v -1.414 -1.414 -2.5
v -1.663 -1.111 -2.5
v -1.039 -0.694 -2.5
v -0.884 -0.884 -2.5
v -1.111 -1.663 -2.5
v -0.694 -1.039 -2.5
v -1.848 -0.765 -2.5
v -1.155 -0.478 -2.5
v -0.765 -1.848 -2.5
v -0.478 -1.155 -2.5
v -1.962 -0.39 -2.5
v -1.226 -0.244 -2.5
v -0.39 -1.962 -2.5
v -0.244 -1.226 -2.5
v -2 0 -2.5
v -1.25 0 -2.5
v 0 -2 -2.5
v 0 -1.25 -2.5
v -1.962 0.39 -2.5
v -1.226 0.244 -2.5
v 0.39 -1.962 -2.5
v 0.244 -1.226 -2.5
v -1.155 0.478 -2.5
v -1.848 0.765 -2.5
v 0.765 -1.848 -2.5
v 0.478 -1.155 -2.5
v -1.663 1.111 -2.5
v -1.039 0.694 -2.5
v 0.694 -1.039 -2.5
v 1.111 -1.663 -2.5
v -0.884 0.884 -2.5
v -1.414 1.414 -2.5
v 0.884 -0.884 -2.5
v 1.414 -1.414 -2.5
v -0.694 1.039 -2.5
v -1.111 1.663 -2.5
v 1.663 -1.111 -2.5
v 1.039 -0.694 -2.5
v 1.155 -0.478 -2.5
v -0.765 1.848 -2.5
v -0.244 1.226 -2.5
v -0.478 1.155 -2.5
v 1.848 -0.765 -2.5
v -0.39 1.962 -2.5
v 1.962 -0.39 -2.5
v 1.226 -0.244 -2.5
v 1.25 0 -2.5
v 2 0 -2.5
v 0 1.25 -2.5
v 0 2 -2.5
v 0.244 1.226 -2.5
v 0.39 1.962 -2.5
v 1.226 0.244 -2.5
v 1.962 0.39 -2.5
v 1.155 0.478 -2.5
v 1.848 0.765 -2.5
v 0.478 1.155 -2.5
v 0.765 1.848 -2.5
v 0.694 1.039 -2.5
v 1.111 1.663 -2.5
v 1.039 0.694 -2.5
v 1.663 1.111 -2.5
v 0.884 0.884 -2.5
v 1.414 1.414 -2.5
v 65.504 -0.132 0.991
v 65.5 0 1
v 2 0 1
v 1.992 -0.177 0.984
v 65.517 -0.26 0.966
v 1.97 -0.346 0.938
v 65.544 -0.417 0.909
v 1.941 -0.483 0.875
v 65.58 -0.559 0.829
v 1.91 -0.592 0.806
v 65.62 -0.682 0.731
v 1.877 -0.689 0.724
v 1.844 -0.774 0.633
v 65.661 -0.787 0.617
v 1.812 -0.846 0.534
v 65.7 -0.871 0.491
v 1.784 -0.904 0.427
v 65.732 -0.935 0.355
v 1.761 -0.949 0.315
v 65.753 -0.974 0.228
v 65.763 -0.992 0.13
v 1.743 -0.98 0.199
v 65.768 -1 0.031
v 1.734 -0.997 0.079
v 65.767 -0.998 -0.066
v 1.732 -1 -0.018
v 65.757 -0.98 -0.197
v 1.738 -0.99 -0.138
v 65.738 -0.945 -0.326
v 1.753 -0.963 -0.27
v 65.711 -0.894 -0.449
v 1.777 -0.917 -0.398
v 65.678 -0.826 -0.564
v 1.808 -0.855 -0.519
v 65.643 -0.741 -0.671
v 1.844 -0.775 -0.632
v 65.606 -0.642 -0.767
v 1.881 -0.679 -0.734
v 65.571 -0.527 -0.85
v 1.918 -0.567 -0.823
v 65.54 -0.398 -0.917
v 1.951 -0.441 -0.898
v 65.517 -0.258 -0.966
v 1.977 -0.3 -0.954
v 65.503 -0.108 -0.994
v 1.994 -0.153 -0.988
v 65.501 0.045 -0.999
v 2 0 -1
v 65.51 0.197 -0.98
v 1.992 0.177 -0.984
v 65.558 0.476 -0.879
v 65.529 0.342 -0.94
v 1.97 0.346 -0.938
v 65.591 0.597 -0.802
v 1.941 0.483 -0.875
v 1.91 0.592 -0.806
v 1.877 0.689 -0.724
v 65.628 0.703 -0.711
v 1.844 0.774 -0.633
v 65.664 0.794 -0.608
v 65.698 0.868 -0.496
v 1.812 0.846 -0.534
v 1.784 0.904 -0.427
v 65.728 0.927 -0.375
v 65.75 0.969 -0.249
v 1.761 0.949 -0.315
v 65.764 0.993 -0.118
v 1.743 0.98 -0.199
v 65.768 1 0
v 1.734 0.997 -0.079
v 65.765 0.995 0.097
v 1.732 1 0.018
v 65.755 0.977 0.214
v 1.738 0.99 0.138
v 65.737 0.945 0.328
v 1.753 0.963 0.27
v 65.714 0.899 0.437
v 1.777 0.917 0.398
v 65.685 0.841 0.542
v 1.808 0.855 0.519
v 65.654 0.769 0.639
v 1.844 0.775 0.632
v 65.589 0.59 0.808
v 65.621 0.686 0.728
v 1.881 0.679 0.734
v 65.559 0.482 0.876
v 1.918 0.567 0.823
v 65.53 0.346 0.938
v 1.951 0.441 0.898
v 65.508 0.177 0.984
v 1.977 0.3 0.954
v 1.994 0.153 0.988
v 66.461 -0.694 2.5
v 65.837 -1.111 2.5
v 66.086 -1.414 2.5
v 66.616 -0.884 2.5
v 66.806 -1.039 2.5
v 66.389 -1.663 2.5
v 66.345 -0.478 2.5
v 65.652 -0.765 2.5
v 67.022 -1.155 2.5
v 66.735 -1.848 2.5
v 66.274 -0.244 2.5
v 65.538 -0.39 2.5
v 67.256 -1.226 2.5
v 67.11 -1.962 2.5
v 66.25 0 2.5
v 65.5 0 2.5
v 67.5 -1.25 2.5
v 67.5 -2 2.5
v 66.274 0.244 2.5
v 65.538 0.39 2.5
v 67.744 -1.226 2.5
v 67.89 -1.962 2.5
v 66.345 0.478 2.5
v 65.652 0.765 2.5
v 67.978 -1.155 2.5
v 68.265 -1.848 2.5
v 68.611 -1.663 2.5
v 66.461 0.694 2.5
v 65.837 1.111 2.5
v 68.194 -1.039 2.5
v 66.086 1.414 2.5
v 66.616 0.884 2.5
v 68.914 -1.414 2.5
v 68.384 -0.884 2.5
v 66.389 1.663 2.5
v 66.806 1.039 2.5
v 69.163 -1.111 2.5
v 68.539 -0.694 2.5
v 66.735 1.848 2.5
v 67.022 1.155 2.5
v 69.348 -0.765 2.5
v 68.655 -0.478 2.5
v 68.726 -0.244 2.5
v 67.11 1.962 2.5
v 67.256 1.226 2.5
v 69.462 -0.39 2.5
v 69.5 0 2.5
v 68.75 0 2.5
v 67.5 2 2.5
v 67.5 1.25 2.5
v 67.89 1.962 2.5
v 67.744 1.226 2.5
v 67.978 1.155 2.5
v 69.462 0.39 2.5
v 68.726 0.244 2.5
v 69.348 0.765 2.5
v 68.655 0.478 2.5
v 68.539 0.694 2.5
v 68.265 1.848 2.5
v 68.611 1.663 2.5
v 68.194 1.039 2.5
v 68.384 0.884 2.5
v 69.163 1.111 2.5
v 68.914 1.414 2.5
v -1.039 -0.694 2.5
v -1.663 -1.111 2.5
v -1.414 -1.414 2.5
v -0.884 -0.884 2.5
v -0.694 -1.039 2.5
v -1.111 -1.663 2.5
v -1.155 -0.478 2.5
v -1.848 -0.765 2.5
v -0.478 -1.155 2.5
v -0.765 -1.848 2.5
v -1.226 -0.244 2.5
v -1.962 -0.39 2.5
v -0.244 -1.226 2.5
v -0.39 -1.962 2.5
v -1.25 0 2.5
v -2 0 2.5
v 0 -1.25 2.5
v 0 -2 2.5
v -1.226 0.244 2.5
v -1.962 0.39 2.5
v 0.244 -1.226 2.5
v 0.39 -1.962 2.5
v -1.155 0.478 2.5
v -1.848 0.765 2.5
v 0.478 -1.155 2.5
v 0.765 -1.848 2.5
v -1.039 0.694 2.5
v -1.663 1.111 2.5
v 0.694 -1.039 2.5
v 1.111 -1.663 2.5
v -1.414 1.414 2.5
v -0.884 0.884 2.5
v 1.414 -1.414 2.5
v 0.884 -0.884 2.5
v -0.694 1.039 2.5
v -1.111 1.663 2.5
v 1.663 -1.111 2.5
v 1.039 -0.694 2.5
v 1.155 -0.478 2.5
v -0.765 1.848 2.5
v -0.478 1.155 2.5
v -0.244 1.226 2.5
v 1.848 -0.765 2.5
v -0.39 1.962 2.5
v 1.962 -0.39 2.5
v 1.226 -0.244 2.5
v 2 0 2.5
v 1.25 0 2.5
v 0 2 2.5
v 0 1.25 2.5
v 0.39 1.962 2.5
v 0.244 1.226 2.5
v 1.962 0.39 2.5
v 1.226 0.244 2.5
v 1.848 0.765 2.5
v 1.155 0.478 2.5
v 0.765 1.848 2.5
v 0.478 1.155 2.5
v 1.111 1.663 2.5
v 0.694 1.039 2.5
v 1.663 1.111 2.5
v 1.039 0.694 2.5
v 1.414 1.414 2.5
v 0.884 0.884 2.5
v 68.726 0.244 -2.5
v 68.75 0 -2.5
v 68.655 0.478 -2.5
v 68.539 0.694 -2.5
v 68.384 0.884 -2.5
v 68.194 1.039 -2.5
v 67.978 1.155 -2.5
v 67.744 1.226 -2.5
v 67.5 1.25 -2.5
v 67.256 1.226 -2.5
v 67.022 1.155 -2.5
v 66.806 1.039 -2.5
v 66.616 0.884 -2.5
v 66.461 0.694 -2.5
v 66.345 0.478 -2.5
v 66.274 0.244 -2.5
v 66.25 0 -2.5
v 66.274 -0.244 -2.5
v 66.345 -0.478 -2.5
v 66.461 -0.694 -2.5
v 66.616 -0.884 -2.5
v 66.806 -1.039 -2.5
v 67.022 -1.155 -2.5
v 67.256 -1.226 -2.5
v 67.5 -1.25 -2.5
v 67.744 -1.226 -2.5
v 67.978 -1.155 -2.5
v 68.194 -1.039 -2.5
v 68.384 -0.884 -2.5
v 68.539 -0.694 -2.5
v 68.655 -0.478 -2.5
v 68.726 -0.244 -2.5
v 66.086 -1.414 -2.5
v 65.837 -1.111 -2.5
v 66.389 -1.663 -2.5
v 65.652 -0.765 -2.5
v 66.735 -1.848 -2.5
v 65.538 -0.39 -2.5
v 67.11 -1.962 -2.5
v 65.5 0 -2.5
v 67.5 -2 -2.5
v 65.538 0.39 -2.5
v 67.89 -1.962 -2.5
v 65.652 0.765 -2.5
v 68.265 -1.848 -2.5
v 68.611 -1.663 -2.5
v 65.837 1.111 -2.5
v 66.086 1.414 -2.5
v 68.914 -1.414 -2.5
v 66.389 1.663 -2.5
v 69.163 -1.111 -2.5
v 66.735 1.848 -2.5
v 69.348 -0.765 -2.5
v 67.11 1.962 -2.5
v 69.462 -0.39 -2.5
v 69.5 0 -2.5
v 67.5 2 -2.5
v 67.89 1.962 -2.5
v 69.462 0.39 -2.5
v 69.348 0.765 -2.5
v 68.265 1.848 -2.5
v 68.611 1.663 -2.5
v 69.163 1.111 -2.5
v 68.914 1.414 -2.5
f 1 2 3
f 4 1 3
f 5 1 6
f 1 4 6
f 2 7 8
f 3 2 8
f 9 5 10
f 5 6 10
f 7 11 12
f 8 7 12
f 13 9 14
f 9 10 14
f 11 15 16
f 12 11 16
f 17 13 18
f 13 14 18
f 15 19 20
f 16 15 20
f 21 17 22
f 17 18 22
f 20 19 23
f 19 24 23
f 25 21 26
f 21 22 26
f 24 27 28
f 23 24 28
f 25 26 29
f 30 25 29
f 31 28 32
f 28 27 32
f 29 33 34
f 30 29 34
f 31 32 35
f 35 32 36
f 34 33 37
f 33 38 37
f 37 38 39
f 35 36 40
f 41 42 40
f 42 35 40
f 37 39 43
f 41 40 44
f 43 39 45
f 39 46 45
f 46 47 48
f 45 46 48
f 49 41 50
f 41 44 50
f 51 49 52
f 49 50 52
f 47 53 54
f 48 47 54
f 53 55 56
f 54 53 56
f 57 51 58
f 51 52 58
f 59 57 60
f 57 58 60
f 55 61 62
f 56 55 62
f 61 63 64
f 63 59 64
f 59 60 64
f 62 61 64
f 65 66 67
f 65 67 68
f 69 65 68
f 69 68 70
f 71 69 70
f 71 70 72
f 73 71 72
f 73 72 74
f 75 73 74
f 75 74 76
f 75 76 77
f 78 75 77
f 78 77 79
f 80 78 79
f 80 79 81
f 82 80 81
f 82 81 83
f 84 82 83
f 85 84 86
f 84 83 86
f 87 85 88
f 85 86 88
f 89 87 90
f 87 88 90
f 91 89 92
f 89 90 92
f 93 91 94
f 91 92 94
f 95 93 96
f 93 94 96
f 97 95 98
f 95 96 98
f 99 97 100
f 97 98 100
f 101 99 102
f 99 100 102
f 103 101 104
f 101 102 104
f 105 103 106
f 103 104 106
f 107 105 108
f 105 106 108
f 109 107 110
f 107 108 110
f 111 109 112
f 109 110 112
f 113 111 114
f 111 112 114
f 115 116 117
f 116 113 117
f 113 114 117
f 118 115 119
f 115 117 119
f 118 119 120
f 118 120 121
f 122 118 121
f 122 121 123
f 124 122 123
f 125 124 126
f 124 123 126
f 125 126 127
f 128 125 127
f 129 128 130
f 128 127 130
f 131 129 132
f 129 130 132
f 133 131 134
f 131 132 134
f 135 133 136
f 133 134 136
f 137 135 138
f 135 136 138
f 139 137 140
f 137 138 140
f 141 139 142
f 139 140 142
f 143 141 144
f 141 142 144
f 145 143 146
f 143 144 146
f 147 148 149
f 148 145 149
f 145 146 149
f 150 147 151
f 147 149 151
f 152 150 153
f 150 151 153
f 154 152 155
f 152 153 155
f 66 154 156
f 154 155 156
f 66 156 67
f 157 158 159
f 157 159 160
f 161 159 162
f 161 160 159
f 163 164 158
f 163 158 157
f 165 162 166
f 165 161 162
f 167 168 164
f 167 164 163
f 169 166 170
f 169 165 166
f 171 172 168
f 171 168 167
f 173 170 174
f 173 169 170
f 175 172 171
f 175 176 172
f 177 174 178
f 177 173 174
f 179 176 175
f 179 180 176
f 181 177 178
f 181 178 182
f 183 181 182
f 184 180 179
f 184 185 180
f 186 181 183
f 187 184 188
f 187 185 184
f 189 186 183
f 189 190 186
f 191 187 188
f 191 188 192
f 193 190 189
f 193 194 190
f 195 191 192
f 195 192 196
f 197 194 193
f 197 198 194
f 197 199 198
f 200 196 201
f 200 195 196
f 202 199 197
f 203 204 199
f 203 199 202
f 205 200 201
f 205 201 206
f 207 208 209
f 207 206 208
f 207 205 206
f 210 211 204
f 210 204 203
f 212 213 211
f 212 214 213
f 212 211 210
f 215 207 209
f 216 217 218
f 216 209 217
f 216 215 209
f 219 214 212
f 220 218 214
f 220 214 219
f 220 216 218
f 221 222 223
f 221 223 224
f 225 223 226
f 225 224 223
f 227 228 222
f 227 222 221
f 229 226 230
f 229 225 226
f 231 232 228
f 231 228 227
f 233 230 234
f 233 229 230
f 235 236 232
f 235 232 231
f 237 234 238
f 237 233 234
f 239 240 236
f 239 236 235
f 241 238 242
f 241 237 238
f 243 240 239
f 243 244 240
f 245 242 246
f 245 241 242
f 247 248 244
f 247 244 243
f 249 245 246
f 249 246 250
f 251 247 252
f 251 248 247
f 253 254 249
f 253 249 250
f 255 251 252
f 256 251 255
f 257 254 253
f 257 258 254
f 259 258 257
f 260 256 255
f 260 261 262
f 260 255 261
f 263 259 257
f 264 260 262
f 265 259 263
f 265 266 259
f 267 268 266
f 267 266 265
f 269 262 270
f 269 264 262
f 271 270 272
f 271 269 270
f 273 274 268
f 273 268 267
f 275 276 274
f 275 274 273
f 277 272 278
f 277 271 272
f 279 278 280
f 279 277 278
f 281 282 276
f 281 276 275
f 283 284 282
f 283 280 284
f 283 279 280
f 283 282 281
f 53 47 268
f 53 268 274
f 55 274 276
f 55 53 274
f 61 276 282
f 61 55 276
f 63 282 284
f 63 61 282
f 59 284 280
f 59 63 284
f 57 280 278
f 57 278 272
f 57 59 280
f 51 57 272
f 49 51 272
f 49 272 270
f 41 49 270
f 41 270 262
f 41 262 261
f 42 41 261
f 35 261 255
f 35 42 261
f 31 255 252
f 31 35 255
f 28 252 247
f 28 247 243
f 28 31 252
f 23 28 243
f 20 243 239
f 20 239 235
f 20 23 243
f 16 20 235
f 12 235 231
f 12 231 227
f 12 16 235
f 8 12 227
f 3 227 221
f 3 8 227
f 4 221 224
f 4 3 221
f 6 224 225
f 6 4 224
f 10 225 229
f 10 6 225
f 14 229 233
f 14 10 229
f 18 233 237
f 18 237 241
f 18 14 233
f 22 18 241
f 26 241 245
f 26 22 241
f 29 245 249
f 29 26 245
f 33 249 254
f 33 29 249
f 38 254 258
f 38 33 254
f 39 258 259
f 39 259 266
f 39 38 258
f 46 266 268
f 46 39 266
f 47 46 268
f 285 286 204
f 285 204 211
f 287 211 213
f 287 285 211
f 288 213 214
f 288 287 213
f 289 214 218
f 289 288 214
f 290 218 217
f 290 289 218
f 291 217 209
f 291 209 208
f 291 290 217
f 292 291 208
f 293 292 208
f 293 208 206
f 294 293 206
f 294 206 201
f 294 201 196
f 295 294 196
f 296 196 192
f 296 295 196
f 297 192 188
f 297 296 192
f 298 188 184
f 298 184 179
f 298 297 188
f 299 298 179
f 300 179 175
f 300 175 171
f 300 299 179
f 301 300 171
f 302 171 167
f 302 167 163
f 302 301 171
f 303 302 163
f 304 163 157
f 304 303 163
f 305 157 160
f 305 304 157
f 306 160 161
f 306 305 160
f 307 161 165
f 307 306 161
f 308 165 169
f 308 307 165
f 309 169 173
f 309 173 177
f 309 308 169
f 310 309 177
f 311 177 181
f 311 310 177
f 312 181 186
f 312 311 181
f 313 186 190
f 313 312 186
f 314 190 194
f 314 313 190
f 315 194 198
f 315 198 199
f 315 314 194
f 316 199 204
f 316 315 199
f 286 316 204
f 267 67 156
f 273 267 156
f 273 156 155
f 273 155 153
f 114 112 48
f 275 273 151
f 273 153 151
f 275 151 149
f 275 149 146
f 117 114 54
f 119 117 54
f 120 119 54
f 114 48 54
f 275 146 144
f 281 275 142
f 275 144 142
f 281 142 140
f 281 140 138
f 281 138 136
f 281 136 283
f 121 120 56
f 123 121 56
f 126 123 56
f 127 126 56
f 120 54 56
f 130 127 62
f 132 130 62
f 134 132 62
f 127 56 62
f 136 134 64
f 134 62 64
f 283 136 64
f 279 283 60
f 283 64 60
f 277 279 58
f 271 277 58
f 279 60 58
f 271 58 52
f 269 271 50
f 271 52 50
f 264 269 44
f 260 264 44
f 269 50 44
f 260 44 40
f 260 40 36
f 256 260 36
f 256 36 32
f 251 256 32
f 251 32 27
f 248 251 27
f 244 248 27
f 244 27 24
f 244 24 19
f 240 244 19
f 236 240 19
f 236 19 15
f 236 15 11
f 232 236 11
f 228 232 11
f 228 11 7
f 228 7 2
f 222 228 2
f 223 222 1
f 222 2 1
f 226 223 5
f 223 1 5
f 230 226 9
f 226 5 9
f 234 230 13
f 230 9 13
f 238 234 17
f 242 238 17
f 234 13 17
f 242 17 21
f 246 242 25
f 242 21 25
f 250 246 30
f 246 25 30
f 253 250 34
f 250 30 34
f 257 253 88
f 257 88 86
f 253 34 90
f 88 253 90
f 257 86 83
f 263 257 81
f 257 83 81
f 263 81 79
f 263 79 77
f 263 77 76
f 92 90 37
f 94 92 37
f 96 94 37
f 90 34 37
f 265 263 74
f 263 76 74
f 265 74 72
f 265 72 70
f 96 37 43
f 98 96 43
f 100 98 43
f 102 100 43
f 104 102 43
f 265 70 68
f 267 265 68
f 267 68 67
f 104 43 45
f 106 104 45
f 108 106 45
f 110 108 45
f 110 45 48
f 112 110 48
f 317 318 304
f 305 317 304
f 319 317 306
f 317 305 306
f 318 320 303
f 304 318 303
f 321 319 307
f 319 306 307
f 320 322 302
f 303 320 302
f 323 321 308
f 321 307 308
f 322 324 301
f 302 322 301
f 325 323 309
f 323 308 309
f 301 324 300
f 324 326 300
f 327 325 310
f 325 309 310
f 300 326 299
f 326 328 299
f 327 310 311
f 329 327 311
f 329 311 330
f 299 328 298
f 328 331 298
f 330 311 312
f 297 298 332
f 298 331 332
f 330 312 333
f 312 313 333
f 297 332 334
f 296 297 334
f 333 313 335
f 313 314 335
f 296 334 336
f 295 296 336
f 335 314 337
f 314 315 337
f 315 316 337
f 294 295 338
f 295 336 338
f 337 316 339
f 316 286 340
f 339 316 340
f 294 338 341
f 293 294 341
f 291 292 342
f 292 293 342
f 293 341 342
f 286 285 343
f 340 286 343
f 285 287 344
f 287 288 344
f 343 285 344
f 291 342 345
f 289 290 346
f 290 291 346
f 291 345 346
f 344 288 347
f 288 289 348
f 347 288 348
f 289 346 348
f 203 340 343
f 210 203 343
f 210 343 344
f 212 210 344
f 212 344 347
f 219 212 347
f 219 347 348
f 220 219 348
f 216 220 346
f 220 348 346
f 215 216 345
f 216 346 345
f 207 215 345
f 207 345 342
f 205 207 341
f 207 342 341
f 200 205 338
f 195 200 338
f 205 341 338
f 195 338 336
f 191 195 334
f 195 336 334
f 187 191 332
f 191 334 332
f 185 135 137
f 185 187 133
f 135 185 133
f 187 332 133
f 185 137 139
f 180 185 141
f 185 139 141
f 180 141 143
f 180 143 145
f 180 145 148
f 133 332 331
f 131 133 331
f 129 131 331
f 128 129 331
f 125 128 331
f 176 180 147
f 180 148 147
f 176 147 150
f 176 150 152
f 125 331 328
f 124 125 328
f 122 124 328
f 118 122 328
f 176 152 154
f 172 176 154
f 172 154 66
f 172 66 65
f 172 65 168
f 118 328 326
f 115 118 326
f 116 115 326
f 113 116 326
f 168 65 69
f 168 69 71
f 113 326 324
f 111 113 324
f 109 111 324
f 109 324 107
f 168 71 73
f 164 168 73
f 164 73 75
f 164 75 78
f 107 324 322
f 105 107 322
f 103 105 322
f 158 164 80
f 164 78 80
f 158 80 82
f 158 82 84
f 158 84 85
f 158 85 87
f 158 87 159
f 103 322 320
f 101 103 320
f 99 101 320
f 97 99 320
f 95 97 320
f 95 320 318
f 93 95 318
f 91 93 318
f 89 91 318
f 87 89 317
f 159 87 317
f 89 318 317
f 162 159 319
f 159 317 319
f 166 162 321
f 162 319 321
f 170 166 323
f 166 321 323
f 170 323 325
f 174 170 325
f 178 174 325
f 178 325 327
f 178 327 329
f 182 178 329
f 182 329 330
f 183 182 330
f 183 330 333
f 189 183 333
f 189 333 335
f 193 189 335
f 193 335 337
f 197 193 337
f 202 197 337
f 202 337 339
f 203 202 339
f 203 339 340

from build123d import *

# Parameters (mm, degrees)
BOSS_EXTRUDE1_DEPTH        = 2.5
BOSS_EXTRUDE1_DEPTH_BACK   = 2.5
SKETCH1_R                  = 2
SKETCH1_R_2                = 1.25
BOSS_EXTRUDE1_2_DEPTH      = 2.5
BOSS_EXTRUDE1_2_DEPTH_BACK = 2.5


with BuildPart() as part:
    # Sketch1 → Boss-Extrude1 (new, two sides: drawn at the far end of the back side and taken through both)
    with BuildSketch(Plane.XY.offset(-BOSS_EXTRUDE1_DEPTH_BACK)):
        Circle(SKETCH1_R)
        Circle(SKETCH1_R_2, mode=Mode.SUBTRACT)
    extrude(amount=BOSS_EXTRUDE1_DEPTH + BOSS_EXTRUDE1_DEPTH_BACK)



with BuildPart() as body_2:
    # Sketch1 → Boss-Extrude1 2 (new, two sides: drawn at the far end of the back side and taken through both)
    with BuildSketch(Plane.XY.offset(-BOSS_EXTRUDE1_2_DEPTH_BACK)):
        with Locations((67.5, 0)):
            Circle(SKETCH1_R)
        with Locations((67.5, 0)):
            Circle(SKETCH1_R_2, mode=Mode.SUBTRACT)
    extrude(amount=BOSS_EXTRUDE1_2_DEPTH + BOSS_EXTRUDE1_2_DEPTH_BACK)


with BuildPart() as part_1:
    add(part.part)

    add(body_2.part)  # Revolve3 merges body 2
    # Sketch2 → Revolve3 (revolve)
    with BuildSketch(Plane.XY):
        with BuildLine():
            ThreePointArc((65.5, 0), (65.568148347, 0.51763809), (65.767949192, 1))
            Line((65.767949192, 1), (1.732050808, 1))
            ThreePointArc((1.732050808, 1), (1.931851653, 0.51763809), (2, 0))
            Line((2, 0), (2.240774351, 0))
            Line((2.240774351, 0), (65.5, 0))
        make_face()
    revolve(axis=Axis((2, 0, 0), (1, 0, 0)))


solid = part_1.part
